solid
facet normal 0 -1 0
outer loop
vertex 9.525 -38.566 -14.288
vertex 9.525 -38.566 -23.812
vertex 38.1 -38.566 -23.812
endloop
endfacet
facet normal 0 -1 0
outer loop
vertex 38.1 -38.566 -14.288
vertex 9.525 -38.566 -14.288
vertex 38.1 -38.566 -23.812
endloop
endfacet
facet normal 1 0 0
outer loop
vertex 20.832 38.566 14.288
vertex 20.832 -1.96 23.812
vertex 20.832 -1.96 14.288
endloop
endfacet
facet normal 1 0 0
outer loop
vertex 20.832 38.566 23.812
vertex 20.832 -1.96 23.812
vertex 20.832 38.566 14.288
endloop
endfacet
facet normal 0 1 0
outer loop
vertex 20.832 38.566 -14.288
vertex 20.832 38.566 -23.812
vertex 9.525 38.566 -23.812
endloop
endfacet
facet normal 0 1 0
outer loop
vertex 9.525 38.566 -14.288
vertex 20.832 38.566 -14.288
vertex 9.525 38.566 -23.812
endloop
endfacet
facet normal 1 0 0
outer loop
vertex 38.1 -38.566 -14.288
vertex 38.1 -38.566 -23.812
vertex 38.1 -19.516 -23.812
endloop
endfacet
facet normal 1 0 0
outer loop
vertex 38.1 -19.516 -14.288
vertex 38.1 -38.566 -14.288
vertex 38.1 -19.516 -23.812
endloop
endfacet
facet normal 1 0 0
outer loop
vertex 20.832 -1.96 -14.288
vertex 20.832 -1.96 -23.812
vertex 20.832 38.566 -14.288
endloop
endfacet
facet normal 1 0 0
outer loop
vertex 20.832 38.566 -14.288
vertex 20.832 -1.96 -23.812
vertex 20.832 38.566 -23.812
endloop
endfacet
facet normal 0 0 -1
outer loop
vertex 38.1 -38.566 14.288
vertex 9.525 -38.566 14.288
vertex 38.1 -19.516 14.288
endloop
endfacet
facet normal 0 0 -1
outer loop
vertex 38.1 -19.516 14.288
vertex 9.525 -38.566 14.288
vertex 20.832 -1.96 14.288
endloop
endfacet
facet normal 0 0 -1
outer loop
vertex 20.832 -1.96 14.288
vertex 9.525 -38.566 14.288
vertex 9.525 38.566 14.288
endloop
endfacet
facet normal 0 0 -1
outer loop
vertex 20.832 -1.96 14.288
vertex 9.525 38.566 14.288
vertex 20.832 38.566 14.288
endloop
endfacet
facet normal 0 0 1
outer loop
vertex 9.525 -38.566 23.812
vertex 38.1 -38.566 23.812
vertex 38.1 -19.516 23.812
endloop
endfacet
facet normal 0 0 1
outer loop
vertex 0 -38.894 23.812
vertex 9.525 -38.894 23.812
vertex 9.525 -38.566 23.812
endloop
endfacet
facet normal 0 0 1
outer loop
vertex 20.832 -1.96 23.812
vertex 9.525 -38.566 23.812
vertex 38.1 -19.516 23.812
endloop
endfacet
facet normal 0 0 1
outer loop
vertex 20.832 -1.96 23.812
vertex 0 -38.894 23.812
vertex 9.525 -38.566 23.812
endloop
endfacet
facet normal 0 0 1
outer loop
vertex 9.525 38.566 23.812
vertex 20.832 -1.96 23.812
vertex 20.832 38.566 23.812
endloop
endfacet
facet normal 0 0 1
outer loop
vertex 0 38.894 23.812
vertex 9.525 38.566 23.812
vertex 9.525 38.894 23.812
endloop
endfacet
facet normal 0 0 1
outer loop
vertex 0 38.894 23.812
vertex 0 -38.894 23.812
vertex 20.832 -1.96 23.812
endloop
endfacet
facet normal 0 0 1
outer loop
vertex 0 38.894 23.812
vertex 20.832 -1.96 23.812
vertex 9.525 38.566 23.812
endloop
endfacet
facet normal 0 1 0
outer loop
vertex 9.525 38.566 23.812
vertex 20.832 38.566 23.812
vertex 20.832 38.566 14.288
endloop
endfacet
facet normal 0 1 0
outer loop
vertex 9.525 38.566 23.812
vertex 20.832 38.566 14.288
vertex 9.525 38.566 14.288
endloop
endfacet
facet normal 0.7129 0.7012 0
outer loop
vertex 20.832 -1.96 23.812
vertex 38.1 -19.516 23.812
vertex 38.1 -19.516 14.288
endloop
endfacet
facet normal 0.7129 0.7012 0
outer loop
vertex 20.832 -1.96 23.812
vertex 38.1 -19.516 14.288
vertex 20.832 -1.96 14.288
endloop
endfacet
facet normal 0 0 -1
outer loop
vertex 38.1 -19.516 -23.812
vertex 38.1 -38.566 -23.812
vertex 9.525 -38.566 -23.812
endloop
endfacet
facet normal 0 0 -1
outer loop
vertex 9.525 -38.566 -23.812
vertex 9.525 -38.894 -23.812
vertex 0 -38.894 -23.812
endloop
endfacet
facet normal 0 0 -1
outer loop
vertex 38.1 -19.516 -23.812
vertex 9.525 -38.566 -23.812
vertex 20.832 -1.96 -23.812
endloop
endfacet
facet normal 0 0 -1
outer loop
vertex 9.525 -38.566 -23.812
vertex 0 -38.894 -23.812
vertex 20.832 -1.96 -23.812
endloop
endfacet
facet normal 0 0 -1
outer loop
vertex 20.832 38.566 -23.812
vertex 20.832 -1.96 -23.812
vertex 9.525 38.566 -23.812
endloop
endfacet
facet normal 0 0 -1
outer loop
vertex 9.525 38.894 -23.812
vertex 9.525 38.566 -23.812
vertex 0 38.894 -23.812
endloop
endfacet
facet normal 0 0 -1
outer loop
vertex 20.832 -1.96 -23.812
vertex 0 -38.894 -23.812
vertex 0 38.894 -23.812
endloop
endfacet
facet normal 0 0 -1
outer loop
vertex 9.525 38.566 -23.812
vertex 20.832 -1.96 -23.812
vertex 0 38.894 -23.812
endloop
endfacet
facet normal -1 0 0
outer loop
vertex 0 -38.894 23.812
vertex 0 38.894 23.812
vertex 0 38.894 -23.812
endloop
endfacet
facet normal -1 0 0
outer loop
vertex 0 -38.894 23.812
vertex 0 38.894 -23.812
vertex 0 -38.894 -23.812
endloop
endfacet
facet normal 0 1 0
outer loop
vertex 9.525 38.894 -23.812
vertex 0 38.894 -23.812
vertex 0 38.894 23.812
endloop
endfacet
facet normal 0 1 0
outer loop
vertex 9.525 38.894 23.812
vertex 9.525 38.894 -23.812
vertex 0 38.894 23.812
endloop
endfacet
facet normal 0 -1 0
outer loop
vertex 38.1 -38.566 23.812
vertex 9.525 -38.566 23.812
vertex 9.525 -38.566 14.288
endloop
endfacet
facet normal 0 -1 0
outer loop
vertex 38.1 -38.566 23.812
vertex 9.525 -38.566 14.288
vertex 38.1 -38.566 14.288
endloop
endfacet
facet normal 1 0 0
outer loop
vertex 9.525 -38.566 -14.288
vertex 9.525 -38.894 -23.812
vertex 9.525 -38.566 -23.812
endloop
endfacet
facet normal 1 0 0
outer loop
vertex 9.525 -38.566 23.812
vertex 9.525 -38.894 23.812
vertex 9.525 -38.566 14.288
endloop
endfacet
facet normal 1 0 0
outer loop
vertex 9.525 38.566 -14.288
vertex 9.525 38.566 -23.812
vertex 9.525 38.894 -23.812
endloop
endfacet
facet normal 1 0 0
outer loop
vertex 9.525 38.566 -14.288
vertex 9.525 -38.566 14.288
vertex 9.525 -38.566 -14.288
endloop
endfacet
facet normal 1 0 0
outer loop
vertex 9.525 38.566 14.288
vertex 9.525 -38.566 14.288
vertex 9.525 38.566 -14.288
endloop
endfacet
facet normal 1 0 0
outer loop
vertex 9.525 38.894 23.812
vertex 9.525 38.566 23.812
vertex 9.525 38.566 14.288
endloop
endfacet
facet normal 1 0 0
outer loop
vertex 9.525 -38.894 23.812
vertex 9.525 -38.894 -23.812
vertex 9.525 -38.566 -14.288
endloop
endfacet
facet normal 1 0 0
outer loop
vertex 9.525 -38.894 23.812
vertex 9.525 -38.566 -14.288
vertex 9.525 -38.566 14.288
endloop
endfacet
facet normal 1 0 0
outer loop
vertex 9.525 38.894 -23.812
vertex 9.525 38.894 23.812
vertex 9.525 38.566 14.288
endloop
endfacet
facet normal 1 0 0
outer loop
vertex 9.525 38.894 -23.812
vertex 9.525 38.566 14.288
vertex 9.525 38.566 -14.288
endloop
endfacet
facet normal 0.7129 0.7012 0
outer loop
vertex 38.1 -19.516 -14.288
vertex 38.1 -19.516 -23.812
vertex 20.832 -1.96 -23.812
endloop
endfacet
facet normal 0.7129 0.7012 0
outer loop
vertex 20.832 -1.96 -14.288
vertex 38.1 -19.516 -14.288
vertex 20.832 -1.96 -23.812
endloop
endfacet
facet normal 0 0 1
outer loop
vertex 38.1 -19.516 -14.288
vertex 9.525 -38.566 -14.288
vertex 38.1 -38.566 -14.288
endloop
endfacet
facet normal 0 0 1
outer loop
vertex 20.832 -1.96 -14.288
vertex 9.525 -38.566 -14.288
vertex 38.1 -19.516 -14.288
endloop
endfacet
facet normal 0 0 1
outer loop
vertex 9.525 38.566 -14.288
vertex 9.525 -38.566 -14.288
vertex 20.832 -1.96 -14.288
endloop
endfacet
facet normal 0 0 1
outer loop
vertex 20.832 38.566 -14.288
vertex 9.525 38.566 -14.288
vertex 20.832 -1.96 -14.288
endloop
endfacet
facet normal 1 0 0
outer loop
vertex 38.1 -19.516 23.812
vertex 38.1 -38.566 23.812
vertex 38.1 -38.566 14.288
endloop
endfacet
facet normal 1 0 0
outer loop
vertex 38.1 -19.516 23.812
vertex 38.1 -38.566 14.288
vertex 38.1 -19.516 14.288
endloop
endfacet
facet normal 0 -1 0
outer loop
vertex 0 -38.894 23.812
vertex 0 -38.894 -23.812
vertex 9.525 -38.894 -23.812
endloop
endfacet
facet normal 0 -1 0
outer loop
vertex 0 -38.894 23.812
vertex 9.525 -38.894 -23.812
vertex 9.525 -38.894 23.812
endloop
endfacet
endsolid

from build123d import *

# Parameters (mm, degrees)
F0_W     = 77.7875
F0_H     = 47.625
F1_DEPTH = 9.525
F2_R     = 12.6438150781
F3_DEPTH = 97
F5_DEPTH = 9.525


# Not quite as in the source:
# - an extrude ends at something that could not be found from the text; its depth is read off the source's solid


with BuildPart() as f1:
    # F0 (on Right) → F1 (new body)
    with BuildSketch(Plane.YZ):
        Rectangle(F0_W, F0_H)
    extrude(amount=F1_DEPTH)

    # F2 (on Right) → F3 (cut, through all)
    with BuildSketch(Plane.YZ):
        Circle(F2_R)
    extrude(amount=-F3_DEPTH, mode=Mode.SUBTRACT)

    # F4 (on face) → F5 (join)
    with BuildSketch(Plane.XY.offset(23.8125)):
        Polygon((0, 38.5659709573), (0, -38.5659709573), (38.1, -38.5659709573), (38.1, -19.5159709573), (20.8316552401, -1.9598177195), (20.8316552401, 38.5659709573), align=None)
    extrude(amount=-F5_DEPTH)

    # F6: F1 across plane


with BuildPart() as f1_1:
    add(f1.part)
    add(f1.part.mirror(Plane.XY))


solid = f1_1.part
